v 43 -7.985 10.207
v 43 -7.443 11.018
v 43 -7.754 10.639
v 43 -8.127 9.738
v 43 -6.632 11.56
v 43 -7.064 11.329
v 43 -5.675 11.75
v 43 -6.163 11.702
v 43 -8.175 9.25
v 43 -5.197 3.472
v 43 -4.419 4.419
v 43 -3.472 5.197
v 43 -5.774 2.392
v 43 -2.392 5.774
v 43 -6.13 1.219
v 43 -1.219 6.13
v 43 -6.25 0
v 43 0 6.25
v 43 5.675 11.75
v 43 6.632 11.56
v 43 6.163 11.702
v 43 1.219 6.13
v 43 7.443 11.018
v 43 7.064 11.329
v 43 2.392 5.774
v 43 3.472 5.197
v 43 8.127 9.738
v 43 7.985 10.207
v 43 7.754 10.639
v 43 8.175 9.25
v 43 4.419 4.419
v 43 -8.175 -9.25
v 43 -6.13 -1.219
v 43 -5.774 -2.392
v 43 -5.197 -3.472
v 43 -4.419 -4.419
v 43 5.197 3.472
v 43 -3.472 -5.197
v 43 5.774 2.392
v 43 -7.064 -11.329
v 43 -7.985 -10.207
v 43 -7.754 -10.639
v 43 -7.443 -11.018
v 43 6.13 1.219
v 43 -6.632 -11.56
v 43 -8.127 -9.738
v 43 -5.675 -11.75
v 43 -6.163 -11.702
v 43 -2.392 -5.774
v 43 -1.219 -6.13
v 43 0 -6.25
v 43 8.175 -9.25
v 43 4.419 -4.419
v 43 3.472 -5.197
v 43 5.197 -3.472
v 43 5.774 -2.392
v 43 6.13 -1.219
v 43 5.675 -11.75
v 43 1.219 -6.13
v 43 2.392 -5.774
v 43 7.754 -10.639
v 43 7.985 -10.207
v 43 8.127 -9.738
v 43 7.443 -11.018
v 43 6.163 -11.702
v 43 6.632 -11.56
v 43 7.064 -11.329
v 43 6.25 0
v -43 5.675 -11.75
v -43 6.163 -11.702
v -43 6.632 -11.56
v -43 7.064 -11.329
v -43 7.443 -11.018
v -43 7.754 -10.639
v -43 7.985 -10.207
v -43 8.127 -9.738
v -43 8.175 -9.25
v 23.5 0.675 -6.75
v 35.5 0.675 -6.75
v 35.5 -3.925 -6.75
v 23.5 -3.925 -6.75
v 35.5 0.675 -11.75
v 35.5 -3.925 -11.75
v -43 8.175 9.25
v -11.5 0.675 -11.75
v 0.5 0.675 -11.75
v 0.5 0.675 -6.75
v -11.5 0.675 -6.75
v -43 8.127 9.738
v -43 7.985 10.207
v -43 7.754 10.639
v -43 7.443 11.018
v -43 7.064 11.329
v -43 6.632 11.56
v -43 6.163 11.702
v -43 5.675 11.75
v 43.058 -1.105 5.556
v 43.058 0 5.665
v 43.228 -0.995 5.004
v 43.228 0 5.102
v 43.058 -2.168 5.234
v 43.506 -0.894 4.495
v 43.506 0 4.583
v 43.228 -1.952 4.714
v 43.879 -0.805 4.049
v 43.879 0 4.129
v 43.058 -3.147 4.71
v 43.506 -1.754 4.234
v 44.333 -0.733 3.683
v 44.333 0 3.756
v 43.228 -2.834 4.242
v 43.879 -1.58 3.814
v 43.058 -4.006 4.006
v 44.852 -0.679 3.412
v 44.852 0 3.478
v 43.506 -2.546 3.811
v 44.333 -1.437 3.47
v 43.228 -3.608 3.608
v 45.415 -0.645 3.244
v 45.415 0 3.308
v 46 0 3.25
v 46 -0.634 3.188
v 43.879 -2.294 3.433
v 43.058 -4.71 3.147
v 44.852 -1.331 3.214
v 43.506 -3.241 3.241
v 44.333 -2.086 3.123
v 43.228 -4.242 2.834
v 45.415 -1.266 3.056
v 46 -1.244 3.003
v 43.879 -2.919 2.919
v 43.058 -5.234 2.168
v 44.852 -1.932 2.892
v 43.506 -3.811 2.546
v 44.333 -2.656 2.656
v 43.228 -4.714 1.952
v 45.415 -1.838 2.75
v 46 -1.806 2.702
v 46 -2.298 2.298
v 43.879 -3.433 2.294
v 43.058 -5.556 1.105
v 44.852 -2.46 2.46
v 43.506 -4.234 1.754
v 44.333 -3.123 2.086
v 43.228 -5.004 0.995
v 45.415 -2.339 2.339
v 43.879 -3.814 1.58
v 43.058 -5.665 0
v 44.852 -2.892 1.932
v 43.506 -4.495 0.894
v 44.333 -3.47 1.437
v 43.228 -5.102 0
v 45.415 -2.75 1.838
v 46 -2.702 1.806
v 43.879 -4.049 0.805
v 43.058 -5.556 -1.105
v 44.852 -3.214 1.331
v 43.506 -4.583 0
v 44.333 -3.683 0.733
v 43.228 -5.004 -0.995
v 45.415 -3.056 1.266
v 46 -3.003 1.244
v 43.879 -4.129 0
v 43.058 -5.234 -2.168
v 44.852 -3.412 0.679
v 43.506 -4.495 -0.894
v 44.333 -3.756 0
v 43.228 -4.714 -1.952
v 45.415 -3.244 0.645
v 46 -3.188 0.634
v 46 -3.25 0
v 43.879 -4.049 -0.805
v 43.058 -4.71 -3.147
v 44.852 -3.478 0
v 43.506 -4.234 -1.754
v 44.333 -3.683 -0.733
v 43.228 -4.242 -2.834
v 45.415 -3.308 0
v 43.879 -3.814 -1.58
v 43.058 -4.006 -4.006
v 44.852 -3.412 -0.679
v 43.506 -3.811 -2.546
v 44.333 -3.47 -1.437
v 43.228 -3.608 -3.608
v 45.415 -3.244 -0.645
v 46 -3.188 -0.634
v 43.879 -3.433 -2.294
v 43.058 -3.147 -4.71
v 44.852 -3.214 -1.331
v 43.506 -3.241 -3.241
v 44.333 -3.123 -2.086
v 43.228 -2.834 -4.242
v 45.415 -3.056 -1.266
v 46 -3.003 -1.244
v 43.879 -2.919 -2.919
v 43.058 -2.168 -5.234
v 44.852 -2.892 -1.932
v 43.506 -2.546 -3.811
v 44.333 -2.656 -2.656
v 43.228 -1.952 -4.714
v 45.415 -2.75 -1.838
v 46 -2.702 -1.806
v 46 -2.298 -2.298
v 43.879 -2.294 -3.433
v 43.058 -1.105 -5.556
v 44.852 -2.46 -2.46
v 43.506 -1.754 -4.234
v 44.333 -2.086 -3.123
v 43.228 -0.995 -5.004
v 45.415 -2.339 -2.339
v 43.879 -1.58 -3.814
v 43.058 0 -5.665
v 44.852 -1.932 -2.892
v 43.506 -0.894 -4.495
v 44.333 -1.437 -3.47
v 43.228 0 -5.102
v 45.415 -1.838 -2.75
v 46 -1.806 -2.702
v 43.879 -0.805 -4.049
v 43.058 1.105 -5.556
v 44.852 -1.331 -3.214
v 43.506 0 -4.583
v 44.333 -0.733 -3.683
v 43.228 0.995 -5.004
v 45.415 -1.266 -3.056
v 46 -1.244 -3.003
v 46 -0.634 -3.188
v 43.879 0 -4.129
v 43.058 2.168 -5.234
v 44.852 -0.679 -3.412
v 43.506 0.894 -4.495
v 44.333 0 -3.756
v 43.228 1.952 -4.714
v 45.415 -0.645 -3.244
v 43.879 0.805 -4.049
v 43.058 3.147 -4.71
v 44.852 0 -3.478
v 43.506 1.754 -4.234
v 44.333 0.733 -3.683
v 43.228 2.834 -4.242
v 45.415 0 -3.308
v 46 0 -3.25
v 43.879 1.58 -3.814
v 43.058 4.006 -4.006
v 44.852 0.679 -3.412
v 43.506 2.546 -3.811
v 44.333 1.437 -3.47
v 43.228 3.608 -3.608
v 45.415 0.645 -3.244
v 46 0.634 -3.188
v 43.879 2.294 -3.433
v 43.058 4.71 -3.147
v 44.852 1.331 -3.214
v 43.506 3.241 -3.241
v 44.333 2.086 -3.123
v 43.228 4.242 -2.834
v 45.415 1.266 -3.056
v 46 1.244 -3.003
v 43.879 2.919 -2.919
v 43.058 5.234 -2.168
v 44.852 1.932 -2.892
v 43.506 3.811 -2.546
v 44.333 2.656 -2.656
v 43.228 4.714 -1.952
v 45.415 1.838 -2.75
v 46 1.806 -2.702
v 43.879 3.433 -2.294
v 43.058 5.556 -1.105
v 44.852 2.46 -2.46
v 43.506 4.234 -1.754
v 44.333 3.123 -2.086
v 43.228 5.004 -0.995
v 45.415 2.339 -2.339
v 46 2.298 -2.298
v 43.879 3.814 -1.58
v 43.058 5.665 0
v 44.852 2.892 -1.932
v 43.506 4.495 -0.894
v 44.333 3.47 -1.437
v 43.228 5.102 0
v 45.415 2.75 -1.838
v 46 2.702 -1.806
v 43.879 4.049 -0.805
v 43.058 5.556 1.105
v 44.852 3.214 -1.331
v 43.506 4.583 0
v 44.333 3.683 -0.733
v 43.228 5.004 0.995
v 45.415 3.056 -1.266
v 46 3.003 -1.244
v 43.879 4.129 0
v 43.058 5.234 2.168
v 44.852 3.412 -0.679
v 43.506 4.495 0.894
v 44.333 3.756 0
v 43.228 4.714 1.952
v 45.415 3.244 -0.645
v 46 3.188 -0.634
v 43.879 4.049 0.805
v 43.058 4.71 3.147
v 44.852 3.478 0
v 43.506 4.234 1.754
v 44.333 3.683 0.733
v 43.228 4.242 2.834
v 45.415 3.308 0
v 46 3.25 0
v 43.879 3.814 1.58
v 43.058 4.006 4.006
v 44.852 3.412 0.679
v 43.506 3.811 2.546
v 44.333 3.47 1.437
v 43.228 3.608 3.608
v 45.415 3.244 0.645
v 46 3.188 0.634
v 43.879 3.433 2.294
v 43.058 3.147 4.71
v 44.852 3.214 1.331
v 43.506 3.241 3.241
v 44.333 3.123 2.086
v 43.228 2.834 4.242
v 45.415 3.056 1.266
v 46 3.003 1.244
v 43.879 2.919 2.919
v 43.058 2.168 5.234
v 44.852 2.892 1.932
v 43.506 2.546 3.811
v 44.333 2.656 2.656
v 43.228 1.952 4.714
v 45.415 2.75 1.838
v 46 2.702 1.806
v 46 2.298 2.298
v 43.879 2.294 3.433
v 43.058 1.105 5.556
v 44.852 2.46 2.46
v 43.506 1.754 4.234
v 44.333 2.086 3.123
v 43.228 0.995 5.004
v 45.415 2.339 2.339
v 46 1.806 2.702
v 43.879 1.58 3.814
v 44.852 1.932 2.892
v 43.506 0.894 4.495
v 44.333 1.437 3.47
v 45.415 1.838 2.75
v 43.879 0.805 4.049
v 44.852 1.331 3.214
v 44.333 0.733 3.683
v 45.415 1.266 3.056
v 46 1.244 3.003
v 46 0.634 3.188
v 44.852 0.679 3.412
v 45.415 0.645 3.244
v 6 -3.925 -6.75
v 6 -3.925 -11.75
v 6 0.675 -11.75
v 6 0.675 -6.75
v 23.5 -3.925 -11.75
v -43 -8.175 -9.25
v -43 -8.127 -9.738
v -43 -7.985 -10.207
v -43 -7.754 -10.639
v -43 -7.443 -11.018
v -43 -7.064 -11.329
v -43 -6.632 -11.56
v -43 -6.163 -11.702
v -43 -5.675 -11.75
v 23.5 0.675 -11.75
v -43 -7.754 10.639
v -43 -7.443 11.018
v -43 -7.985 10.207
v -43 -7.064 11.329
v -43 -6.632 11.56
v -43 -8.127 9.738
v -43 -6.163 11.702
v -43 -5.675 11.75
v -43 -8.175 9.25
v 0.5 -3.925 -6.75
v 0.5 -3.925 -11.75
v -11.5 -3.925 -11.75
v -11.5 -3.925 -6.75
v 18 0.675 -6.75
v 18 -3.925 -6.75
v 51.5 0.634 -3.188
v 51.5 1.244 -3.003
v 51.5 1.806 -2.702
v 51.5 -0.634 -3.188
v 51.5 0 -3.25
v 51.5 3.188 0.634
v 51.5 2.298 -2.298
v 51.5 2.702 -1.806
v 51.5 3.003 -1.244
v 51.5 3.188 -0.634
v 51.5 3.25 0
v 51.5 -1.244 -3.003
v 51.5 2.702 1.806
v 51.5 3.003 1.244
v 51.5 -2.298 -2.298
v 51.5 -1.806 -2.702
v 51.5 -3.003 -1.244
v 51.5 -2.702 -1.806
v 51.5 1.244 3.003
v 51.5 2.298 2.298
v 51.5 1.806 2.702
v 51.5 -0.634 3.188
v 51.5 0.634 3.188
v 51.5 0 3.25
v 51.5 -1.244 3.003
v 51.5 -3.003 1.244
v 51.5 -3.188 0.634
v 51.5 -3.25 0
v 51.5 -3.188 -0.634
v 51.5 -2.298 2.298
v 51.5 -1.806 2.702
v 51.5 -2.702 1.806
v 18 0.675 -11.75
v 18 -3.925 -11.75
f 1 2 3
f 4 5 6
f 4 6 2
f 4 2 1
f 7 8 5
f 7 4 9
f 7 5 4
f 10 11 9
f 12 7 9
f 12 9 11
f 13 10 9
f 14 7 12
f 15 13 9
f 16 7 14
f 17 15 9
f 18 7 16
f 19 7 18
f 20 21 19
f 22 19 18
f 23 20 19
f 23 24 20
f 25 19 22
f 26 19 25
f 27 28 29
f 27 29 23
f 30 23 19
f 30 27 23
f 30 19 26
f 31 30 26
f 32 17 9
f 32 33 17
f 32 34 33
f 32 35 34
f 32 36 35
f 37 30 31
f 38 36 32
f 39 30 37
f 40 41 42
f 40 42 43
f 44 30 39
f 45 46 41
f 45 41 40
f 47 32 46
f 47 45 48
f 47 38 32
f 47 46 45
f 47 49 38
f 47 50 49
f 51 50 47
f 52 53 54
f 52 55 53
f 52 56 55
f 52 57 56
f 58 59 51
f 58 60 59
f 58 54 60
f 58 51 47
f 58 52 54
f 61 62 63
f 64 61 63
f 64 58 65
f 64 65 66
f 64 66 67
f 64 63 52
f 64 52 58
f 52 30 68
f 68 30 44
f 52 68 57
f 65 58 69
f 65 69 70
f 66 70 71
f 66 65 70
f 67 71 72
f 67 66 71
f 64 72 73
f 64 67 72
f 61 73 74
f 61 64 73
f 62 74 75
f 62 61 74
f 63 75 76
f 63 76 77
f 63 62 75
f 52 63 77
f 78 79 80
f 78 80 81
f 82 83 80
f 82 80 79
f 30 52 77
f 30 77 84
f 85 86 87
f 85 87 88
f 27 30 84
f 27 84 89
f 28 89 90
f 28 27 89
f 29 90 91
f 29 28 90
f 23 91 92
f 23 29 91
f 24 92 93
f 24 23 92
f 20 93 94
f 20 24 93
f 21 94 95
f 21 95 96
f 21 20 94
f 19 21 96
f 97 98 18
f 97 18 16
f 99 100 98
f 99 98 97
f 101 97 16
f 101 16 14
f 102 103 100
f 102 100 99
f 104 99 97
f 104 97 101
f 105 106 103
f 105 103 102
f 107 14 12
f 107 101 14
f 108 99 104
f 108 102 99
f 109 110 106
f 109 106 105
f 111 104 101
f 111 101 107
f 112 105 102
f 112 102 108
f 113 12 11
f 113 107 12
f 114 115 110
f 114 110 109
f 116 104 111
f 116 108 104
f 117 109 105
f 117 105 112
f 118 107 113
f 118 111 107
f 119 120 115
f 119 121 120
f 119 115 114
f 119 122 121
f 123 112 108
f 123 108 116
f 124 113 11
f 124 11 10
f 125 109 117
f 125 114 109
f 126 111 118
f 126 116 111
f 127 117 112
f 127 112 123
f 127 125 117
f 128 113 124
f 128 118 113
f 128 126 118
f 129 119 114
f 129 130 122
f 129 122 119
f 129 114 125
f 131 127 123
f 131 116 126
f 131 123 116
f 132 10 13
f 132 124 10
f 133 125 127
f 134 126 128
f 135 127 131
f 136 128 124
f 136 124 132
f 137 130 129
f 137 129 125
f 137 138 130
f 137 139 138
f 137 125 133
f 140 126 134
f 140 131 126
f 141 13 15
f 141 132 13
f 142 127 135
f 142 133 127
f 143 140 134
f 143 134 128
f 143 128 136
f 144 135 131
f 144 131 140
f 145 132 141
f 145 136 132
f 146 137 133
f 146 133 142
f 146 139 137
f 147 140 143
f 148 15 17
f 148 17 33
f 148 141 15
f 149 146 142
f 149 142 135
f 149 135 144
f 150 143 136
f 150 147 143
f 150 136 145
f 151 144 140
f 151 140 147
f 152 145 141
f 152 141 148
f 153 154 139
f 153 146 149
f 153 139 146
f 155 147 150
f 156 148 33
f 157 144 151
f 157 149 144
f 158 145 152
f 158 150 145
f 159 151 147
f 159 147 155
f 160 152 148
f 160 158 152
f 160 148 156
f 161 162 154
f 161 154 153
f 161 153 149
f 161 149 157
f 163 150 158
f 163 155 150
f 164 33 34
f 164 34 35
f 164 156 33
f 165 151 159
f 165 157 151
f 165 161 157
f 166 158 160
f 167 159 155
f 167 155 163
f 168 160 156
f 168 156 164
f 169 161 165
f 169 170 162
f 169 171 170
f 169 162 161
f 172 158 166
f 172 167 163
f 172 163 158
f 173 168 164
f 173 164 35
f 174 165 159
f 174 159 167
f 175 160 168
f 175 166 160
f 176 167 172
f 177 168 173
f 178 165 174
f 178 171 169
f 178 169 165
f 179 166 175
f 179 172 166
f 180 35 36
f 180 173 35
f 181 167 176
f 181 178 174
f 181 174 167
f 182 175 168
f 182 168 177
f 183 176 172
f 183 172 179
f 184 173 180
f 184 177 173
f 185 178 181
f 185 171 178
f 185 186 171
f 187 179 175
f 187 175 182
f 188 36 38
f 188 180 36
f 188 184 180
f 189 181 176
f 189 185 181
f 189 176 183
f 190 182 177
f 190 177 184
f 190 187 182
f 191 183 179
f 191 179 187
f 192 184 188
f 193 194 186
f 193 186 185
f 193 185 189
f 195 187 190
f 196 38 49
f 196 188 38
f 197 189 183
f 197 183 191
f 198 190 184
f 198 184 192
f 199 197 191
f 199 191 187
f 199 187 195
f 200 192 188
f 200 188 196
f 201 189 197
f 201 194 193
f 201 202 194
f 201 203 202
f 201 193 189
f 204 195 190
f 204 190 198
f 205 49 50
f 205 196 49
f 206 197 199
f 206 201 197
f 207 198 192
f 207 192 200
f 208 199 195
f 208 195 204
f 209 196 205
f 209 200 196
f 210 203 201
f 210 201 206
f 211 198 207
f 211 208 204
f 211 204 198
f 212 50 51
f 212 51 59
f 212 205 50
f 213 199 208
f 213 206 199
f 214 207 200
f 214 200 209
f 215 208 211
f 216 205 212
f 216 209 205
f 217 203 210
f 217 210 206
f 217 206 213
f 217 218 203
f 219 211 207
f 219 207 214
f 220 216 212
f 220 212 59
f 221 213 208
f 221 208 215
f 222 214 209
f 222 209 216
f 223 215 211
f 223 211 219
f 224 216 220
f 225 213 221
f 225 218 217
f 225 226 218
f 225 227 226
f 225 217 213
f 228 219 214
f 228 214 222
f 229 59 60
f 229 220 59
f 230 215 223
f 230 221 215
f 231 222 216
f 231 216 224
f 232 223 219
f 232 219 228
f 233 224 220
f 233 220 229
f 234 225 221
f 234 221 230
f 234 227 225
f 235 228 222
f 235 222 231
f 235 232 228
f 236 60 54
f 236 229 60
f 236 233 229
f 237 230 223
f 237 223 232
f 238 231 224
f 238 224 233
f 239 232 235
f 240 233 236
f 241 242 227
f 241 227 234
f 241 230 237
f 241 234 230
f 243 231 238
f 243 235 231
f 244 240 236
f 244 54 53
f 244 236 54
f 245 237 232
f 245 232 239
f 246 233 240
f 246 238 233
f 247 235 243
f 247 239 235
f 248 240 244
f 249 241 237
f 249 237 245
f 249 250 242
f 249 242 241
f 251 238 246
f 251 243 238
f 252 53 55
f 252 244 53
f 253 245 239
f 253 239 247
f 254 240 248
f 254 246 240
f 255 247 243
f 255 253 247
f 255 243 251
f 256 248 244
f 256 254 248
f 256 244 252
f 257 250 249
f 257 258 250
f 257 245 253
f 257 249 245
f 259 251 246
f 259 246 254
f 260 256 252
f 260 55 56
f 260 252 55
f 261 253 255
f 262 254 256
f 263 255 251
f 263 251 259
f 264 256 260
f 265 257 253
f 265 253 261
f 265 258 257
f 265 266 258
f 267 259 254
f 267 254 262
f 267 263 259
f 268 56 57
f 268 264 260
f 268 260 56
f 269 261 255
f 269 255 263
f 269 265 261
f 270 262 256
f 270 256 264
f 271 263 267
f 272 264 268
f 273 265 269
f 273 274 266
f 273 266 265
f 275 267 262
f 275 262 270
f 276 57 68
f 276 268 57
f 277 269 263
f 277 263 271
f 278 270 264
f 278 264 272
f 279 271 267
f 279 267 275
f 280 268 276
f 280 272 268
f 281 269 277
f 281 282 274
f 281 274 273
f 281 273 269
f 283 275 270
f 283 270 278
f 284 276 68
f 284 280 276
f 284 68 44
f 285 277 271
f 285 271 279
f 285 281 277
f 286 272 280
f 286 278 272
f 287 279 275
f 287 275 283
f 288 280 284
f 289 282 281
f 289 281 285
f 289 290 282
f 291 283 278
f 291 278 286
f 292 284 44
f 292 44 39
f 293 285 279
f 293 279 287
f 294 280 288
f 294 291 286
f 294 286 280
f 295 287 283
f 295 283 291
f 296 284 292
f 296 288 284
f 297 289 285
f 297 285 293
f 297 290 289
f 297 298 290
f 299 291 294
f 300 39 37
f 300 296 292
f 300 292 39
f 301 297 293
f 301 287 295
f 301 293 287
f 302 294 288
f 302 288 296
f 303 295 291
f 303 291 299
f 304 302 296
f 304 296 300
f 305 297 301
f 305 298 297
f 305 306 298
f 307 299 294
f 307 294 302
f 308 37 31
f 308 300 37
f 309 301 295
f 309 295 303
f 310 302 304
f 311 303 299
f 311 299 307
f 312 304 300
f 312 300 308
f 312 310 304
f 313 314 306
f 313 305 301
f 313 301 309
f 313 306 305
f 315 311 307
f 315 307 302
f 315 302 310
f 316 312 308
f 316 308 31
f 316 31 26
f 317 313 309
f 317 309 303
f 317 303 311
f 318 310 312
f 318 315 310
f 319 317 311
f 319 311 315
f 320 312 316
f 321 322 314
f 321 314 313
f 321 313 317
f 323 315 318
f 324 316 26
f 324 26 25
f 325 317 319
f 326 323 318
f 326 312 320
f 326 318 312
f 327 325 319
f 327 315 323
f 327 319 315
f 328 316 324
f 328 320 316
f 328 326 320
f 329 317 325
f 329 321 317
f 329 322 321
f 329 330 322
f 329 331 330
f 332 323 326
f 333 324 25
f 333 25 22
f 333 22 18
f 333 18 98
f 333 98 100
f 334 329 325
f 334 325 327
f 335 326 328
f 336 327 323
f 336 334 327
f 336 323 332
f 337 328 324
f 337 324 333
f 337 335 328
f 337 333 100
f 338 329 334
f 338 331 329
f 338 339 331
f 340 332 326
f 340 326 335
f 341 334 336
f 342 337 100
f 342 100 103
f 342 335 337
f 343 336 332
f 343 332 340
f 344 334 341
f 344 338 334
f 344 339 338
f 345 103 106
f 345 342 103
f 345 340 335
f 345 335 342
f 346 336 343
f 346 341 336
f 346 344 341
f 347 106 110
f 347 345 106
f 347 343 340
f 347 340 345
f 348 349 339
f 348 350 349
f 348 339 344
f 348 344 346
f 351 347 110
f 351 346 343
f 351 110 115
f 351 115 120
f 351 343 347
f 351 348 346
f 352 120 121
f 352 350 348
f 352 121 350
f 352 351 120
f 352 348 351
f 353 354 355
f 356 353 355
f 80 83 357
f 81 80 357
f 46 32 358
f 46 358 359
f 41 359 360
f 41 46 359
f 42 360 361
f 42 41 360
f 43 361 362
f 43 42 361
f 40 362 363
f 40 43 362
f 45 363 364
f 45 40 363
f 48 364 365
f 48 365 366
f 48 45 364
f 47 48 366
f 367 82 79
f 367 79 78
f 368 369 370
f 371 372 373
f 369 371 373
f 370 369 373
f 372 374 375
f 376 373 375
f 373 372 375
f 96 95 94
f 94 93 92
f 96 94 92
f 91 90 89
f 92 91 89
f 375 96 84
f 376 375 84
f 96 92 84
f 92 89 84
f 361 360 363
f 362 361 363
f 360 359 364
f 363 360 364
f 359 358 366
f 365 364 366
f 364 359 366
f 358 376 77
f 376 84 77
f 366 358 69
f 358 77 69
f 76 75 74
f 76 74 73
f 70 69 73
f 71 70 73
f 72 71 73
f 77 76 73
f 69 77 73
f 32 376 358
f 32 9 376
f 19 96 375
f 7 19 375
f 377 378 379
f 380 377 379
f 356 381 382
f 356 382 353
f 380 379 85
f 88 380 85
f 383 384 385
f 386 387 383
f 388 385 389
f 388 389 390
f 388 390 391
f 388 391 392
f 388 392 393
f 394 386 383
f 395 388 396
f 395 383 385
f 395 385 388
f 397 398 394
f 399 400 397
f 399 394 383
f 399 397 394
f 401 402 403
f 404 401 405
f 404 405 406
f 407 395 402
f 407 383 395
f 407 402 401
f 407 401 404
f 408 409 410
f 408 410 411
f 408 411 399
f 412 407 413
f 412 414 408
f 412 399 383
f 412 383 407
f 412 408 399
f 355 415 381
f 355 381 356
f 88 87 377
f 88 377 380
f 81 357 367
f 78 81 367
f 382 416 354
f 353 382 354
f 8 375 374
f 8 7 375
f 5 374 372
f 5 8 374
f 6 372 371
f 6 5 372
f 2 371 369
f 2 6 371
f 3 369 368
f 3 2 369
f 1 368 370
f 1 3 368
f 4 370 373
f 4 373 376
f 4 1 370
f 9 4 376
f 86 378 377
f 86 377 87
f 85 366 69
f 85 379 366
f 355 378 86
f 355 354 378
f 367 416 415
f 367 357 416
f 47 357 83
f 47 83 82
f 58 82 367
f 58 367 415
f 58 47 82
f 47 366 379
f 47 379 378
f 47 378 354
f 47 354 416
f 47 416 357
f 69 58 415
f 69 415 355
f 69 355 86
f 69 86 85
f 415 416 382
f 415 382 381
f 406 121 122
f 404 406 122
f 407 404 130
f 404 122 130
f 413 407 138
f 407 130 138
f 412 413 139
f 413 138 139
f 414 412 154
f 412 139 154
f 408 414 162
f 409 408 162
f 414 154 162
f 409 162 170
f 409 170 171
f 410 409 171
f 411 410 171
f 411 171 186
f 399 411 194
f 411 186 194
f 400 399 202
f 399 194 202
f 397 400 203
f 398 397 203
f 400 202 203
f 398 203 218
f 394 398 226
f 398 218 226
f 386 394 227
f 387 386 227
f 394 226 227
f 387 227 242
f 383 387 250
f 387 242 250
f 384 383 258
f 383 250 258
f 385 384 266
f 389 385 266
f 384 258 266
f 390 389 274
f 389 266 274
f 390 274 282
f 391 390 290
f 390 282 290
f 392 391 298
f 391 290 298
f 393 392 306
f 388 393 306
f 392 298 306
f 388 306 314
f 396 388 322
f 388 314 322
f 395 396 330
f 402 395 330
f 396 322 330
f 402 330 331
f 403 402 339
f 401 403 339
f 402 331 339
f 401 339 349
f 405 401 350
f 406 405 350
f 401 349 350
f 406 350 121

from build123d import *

# Parameters (mm, degrees)
BOSS_EXTRUDE1_DEPTH = 43
SKETCH2_R           = 3.25
BOSS_EXTRUDE2_DEPTH = 8.5
FILLET1_R           = 3
SKETCH3_W           = 12
SKETCH3_H           = 4.6
CUT_EXTRUDE1_DEPTH  = 5


with BuildPart() as part:
    # Sketch1 → Boss-Extrude1 (new, symmetric)
    with BuildSketch(Plane(origin=(0, 0, 0), x_dir=(0, 0, -1), z_dir=(1, 0, 0))):
        with BuildLine():
            Line((-9.25, -8.175), (9.25, -8.175))
            ThreePointArc((9.25, -8.175), (11.017766953, -7.442766953), (11.75, -5.675))
            Line((11.75, -5.675), (11.75, 5.675))
            ThreePointArc((11.75, 5.675), (11.017766953, 7.442766953), (9.25, 8.175))
            Line((9.25, 8.175), (-9.25, 8.175))
            ThreePointArc((-9.25, 8.175), (-11.017766953, 7.442766953), (-11.75, 5.675))
            Line((-11.75, 5.675), (-11.75, -5.675))
            ThreePointArc((-11.75, -5.675), (-11.017766953, -7.442766953), (-9.25, -8.175))
        make_face()
    extrude(amount=BOSS_EXTRUDE1_DEPTH, both=True)

    # Sketch2 → Boss-Extrude2 (add)
    with BuildSketch(Plane(origin=(43, 0, 0), x_dir=(0, 0, -1), z_dir=(1, 0, 0))):
        with Locations(Location((0, 0, 0), (0, 0, 180))):
            Circle(SKETCH2_R)
    extrude(amount=BOSS_EXTRUDE2_DEPTH)

    # Fillet1
    fillet1_edges = [part.edges().sort_by_distance(p)[0] for p in [
        (43, 0, -3.25),
    ]]
    fillet(fillet1_edges, radius=FILLET1_R)

    # Sketch3 → Cut-Extrude1 (cut)
    with BuildSketch(Plane(origin=(0, 0, -11.75), x_dir=(-1, 0, 0), z_dir=(0, 0, -1))):
        with Locations((5.5, -1.625)):
            Rectangle(SKETCH3_W, SKETCH3_H)
        with Locations((-12, -1.625)):
            Rectangle(SKETCH3_W, SKETCH3_H)
        with Locations((-29.5, -1.625)):
            Rectangle(SKETCH3_W, SKETCH3_H)
    extrude(amount=-CUT_EXTRUDE1_DEPTH, mode=Mode.SUBTRACT)


solid = part.part
